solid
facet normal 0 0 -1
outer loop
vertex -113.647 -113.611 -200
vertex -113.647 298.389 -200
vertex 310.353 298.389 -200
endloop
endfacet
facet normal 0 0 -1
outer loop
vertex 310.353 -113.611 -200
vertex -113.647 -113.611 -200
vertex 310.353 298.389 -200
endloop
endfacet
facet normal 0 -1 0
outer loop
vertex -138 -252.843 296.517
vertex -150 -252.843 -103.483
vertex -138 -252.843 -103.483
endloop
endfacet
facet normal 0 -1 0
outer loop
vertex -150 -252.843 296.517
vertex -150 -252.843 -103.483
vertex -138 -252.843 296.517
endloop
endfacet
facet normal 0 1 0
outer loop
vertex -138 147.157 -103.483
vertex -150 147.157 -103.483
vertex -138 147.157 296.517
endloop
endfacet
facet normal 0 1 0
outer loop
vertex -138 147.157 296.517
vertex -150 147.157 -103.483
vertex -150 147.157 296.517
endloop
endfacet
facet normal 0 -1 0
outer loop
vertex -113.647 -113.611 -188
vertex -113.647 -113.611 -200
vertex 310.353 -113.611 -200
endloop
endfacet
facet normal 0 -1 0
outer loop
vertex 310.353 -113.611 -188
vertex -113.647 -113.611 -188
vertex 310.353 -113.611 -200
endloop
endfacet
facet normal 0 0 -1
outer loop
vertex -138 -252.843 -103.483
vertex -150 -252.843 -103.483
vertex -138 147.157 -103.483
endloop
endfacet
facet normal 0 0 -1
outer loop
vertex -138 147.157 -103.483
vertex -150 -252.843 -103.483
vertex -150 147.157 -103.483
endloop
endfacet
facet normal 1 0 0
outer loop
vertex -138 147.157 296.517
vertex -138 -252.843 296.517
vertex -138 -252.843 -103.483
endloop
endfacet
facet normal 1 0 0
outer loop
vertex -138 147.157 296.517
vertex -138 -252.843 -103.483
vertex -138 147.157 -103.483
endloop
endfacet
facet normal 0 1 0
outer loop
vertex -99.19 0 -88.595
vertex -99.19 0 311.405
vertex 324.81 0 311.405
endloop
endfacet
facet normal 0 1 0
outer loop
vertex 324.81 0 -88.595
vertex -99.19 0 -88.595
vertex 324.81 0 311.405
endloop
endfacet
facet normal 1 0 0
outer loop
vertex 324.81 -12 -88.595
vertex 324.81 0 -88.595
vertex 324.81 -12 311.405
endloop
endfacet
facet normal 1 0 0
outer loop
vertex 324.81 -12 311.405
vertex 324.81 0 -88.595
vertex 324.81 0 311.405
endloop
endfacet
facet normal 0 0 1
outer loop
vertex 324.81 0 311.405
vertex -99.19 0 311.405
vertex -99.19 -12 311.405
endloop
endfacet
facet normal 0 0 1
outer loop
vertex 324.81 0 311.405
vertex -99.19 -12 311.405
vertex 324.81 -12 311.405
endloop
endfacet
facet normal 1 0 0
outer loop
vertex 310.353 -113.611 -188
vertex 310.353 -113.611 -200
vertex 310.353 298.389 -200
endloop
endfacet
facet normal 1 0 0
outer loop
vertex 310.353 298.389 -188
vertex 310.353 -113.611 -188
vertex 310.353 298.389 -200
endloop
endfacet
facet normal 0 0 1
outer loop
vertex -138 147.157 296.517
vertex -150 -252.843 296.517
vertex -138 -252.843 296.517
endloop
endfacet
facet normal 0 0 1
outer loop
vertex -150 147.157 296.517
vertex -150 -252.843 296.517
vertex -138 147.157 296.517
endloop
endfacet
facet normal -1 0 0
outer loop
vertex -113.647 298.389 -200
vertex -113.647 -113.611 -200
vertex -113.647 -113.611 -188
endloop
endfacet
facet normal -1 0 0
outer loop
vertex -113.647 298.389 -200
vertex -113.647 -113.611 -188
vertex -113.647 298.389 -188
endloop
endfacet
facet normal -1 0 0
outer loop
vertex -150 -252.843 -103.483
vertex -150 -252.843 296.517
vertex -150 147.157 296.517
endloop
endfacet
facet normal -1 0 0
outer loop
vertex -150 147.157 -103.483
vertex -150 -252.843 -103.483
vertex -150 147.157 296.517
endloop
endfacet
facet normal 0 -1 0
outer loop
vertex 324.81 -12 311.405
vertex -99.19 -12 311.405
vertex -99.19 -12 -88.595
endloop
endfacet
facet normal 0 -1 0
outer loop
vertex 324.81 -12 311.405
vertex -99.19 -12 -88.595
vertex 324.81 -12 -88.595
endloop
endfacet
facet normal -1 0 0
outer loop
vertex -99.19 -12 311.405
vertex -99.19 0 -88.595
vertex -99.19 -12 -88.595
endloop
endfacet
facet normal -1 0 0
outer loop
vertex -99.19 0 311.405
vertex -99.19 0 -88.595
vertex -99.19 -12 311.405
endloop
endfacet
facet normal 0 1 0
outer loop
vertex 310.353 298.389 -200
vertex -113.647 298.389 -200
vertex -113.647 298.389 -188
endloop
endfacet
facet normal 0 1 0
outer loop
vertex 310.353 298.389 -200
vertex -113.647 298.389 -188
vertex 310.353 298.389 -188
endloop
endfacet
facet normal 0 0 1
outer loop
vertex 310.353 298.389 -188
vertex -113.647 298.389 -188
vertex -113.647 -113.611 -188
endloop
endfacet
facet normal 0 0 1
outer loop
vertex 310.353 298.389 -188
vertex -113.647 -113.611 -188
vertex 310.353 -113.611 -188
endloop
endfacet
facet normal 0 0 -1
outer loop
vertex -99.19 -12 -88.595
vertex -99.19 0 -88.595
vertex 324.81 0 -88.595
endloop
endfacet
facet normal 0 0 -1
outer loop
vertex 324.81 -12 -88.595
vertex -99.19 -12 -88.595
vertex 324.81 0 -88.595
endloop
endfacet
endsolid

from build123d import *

# Parameters (mm, degrees)
F0_W     = 424
F0_H     = 400
F1_DEPTH = 12
F3_W     = 424
F3_H     = 412
F4_DEPTH = 12
F6_W     = 400
F6_H     = 400
F7_DEPTH = 12


with BuildPart() as f1:
    # F0 (on Front) → F1 (new body)
    with BuildSketch(Plane.XZ):
        with Locations((112.809832, 111.40499)):
            Rectangle(F0_W, F0_H)
    extrude(amount=F1_DEPTH)


with BuildPart() as f4:
    # F3 (on offset) → F4 (new body)
    with BuildSketch(Plane.XY.offset(-200)):
        with Locations((98.353195, 92.388749)):
            Rectangle(F3_W, F3_H)
    extrude(amount=F4_DEPTH)


with BuildPart() as f7:
    # F6 (on offset) → F7 (new body)
    with BuildSketch(Plane.YZ.offset(-150)):
        with Locations((-52.842546, 96.516547)):
            Rectangle(F6_W, F6_H)
    extrude(amount=F7_DEPTH)


solid = Compound([f1.part, f4.part, f7.part])
